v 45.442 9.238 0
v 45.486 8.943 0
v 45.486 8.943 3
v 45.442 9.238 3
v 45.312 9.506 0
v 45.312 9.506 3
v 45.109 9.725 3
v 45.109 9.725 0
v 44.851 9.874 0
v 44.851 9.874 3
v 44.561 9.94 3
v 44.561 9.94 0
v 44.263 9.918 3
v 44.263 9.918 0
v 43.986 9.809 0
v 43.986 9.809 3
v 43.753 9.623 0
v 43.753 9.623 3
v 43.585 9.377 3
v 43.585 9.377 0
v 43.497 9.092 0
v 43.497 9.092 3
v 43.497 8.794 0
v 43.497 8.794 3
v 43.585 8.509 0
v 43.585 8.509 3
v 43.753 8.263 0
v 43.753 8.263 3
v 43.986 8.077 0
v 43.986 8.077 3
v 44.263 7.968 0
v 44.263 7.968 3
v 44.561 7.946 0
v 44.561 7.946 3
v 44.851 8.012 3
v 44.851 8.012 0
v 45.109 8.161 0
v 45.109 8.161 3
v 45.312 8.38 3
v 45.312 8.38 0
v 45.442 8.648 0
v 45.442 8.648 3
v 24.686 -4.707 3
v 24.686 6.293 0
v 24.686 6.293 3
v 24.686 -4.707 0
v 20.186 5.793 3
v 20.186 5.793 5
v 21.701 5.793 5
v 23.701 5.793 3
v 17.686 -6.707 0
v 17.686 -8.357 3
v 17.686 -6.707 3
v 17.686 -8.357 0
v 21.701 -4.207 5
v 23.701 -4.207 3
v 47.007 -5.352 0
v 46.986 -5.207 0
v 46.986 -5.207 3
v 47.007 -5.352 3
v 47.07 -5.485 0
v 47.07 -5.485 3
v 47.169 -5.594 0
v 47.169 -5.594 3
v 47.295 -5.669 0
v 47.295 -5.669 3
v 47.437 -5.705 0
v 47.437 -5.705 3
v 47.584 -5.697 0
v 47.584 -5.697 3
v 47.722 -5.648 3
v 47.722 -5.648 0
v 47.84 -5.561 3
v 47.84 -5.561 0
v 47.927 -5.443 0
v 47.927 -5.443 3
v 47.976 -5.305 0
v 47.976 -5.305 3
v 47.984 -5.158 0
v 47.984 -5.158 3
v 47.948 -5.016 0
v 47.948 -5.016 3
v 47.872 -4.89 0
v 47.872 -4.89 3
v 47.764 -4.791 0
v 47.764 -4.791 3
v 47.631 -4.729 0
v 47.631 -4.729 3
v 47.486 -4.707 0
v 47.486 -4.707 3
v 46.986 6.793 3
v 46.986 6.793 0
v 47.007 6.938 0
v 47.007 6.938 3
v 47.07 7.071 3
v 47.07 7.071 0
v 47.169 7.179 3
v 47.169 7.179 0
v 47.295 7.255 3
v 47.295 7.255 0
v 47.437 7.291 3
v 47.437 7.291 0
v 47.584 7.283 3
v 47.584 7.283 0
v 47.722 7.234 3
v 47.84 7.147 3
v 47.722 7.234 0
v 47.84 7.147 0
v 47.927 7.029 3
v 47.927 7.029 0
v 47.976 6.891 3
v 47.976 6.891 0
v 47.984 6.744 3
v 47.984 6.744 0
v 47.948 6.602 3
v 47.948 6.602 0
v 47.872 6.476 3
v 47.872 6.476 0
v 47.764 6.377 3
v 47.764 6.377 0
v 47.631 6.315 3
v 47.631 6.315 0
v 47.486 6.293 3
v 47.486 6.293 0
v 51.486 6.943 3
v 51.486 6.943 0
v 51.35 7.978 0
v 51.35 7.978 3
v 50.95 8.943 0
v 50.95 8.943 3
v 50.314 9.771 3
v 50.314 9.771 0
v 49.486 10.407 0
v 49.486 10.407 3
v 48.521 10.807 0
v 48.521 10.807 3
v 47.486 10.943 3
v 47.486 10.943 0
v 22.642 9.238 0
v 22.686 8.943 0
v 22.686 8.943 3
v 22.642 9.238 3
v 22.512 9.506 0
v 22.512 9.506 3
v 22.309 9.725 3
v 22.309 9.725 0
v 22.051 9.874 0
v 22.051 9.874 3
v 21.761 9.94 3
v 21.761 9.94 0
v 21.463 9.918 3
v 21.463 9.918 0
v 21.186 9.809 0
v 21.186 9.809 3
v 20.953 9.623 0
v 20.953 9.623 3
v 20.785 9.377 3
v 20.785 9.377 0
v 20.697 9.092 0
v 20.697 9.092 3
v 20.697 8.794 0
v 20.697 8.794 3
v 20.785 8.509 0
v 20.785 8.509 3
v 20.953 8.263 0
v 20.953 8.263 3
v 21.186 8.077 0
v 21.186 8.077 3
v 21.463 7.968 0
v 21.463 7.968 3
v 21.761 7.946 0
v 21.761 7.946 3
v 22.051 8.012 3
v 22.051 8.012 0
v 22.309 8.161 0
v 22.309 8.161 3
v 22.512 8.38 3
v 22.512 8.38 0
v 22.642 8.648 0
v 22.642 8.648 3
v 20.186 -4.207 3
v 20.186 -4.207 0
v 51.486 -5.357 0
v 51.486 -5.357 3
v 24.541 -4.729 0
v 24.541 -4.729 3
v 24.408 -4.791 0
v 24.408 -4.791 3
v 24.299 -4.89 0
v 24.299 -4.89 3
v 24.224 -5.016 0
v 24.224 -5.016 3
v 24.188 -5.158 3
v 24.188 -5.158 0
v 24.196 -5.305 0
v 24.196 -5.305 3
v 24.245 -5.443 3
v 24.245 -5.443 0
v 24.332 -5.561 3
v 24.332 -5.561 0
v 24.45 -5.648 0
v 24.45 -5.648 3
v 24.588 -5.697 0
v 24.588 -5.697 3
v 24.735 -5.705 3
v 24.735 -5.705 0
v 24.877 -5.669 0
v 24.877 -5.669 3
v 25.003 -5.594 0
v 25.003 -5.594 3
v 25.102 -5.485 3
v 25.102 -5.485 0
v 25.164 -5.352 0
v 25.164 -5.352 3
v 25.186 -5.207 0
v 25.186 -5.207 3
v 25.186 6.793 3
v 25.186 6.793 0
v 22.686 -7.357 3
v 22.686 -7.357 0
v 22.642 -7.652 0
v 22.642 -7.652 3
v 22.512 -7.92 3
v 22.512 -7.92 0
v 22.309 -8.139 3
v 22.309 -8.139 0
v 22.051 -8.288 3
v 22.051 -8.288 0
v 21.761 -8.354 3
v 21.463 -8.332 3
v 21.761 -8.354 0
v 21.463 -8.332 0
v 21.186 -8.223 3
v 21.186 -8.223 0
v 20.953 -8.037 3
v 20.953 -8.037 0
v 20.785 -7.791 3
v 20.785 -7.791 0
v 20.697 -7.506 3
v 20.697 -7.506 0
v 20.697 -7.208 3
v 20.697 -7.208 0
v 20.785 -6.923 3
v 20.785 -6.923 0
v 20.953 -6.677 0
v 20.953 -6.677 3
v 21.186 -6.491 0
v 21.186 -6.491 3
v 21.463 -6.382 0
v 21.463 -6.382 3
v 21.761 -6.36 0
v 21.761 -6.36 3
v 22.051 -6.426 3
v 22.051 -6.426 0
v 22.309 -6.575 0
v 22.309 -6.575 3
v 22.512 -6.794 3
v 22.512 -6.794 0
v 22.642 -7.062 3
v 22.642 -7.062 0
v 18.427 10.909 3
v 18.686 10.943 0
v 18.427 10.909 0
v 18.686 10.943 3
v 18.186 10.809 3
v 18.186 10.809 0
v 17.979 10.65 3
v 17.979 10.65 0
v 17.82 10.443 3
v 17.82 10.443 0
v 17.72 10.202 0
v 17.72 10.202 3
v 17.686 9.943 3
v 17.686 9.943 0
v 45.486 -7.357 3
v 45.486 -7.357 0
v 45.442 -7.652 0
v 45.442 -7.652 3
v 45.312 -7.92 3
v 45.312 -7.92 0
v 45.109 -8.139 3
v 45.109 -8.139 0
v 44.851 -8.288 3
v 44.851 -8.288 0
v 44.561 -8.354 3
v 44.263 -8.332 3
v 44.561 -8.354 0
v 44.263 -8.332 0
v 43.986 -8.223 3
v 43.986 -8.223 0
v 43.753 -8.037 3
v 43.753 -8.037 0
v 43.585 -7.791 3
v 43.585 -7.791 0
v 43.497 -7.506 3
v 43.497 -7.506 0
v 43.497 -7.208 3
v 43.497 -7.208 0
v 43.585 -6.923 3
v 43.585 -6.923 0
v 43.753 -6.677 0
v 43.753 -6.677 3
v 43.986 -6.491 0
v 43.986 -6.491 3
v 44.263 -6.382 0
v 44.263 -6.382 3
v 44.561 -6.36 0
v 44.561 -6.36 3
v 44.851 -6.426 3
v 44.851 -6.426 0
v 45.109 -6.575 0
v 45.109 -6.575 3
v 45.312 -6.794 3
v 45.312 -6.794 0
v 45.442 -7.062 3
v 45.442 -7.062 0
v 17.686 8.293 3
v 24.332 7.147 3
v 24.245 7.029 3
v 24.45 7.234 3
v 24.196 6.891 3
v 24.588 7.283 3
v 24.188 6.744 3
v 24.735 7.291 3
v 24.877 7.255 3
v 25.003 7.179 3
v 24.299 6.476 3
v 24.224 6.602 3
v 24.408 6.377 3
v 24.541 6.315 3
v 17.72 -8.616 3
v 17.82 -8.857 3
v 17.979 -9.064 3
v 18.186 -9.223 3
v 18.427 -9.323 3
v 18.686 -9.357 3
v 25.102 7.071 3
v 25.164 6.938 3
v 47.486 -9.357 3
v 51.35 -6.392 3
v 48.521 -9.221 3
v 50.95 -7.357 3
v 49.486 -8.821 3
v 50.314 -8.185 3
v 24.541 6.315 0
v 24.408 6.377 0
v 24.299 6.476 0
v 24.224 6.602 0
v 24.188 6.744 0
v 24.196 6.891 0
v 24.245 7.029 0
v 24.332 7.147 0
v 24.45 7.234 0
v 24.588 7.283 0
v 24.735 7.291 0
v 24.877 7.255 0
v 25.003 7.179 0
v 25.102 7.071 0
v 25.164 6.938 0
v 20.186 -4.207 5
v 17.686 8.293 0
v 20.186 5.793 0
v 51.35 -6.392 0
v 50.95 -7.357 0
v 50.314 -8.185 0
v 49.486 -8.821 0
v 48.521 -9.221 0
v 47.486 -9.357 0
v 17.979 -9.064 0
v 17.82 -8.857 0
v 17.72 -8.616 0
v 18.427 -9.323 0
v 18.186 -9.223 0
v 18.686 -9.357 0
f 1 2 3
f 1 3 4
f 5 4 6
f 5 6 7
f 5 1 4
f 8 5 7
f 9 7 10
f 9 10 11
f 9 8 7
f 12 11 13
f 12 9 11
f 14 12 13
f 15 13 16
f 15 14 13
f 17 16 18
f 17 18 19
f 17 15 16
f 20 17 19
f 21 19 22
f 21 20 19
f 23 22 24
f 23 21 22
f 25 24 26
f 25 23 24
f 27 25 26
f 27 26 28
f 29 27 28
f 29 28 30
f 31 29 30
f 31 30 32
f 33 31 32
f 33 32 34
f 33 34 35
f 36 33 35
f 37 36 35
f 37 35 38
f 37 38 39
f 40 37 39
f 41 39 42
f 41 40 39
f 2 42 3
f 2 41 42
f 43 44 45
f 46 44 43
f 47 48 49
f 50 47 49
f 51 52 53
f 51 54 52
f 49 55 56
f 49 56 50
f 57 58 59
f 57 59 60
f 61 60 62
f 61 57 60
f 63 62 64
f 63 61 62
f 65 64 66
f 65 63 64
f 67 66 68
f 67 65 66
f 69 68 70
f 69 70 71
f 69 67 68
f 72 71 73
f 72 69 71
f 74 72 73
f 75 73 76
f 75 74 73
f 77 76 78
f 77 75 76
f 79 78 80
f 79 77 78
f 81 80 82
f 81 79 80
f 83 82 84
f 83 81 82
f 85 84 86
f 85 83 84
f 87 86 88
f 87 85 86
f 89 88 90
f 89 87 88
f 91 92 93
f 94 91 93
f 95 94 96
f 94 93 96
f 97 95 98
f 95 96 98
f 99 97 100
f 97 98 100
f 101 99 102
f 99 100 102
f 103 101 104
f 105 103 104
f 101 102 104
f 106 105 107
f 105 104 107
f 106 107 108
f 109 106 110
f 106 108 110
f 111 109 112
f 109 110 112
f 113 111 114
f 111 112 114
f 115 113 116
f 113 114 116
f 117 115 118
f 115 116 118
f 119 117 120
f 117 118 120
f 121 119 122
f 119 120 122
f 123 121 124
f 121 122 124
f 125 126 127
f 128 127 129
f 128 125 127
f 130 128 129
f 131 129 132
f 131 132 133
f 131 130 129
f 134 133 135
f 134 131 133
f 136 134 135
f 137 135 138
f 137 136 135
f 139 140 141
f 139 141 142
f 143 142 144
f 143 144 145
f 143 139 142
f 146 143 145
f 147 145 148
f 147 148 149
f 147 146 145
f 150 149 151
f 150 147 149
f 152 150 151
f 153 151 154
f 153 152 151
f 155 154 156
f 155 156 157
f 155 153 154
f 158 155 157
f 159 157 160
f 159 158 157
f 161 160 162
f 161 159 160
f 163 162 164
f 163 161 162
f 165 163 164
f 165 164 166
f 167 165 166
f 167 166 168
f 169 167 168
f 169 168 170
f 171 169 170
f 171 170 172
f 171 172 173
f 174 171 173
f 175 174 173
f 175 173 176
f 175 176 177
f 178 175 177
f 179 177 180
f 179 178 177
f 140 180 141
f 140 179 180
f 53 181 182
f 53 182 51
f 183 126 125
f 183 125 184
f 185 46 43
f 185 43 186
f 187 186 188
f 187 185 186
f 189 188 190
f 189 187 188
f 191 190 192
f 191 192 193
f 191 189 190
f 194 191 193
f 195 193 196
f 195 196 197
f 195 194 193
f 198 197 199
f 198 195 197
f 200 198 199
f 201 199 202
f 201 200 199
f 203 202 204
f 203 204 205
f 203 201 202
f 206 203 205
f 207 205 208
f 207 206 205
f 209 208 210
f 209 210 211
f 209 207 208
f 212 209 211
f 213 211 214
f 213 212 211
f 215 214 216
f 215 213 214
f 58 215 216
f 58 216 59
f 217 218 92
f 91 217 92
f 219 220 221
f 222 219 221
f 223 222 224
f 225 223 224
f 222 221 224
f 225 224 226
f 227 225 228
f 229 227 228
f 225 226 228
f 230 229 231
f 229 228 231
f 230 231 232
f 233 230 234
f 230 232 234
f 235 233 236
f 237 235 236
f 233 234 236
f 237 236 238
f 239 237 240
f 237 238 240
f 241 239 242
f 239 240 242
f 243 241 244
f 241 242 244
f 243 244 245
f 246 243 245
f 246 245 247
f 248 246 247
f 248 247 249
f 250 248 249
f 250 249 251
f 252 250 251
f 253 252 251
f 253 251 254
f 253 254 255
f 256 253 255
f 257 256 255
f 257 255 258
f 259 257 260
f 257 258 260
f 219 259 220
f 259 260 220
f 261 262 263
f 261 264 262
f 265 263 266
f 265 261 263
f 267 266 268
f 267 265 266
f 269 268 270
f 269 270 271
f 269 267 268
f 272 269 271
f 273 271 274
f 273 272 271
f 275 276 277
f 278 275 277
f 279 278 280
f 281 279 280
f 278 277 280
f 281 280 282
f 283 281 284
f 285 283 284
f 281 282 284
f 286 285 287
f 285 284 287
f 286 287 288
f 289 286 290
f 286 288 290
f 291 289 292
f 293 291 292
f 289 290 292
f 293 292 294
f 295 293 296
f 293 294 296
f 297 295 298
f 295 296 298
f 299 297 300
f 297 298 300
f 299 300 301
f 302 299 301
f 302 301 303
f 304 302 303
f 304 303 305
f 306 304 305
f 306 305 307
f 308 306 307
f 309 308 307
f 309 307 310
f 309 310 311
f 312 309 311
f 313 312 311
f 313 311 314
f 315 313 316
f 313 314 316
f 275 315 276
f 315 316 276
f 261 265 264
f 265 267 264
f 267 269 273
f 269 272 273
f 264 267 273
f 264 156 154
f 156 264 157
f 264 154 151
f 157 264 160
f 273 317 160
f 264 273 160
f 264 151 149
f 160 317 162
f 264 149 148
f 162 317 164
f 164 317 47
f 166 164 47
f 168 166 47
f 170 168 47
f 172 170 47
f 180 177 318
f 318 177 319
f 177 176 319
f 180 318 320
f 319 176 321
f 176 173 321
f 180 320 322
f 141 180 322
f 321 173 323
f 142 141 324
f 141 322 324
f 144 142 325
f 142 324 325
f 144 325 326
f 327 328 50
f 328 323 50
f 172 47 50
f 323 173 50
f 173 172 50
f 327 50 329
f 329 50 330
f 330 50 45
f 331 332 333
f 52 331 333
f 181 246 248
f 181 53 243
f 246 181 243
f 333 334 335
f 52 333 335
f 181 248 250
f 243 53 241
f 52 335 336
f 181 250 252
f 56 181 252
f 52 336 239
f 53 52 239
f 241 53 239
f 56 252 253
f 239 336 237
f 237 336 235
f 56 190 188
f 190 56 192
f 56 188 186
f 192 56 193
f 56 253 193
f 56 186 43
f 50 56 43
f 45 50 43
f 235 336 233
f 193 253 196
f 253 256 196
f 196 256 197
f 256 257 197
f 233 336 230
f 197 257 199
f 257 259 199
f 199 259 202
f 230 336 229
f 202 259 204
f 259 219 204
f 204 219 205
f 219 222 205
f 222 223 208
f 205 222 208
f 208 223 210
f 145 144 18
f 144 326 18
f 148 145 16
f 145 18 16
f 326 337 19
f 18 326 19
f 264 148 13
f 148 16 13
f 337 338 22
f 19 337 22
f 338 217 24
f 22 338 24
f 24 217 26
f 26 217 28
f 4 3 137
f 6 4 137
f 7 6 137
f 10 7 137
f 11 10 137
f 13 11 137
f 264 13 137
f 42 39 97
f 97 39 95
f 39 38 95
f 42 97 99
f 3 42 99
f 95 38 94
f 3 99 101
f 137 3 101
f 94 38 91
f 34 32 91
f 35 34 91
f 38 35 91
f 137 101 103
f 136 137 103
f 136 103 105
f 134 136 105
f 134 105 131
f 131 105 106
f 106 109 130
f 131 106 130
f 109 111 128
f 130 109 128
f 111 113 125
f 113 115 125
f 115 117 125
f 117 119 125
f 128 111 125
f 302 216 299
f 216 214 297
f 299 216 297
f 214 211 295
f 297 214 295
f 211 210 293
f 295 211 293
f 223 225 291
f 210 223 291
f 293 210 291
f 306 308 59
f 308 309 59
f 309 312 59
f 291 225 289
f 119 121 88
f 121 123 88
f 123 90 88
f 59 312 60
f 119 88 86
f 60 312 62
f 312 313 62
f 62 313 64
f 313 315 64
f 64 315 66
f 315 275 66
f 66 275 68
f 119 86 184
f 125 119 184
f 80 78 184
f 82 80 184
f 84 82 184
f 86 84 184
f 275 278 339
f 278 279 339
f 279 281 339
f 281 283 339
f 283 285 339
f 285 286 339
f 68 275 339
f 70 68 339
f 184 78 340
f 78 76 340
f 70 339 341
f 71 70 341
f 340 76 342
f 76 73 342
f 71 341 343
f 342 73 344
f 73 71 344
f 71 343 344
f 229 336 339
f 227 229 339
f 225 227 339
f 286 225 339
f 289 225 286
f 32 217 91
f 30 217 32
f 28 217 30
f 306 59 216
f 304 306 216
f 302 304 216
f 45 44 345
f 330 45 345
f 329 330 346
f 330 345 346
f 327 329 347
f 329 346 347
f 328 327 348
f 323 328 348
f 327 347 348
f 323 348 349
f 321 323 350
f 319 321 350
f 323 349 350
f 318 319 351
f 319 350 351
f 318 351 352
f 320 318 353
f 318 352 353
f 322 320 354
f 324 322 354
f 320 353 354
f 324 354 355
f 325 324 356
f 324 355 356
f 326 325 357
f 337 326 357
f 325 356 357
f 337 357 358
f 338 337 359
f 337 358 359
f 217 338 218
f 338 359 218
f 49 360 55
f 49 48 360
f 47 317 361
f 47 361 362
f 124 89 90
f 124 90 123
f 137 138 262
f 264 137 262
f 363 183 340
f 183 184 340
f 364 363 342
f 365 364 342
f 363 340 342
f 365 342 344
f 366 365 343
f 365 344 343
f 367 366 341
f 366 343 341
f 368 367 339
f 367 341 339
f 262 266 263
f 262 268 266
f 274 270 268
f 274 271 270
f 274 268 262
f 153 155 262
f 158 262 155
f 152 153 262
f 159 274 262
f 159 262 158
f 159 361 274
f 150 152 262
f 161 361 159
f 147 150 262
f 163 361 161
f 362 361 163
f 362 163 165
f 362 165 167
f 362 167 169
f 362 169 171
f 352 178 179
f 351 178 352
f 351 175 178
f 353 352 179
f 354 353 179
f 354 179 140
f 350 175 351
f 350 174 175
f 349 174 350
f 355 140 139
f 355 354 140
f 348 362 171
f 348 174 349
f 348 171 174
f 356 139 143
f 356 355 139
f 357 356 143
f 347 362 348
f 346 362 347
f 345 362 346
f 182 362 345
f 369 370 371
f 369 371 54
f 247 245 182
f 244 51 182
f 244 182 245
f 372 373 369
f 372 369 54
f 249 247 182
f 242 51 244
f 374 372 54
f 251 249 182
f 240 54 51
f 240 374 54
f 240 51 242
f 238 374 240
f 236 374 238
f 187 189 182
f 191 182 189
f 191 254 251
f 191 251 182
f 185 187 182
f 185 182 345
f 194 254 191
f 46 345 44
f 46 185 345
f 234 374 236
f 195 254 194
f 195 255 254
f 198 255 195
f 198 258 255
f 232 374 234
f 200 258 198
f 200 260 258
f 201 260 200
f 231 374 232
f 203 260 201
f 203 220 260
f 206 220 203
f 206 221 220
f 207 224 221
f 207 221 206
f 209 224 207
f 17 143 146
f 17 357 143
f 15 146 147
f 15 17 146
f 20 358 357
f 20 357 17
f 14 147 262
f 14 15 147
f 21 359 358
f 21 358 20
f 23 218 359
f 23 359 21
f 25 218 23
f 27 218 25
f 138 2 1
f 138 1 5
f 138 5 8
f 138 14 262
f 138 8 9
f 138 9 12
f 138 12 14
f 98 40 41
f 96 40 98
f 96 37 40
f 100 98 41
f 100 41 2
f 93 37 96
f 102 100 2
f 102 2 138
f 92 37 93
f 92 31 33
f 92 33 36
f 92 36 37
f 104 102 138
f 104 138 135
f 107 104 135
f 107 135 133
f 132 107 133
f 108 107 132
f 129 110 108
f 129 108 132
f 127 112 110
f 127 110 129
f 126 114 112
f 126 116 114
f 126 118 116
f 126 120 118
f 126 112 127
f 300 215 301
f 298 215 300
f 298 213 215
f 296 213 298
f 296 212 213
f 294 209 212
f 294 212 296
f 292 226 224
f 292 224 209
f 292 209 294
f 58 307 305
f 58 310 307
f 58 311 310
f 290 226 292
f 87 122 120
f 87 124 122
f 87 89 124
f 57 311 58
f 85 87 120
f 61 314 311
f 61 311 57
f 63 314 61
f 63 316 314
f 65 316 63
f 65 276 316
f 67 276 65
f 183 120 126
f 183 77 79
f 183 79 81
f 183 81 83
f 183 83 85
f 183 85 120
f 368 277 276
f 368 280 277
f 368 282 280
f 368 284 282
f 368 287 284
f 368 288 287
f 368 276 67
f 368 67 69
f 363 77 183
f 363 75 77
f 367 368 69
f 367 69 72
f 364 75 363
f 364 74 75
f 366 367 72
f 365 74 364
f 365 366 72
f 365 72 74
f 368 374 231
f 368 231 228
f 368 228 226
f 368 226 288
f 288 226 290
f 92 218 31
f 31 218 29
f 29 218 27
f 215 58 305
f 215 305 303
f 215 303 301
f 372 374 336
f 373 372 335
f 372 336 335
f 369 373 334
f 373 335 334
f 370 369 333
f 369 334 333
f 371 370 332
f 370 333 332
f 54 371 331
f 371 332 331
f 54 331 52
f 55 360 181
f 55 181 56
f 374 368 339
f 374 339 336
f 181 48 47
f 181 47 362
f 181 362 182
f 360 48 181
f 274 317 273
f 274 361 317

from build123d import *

# Parameters (mm, degrees)
SKETCH2_R           = 1
BOSS_EXTRUDE1_DEPTH = 3
SKETCH3_W           = 3.515258844
SKETCH3_H           = 10
BOSS_EXTRUDE2_DEPTH = 2
CHAMFER1_SIZE       = 2
FILLET1_R           = 4
FILLET2_R           = 1
CUT_EXTRUDE1_DEPTH  = 4


with BuildPart() as part:
    # Sketch2 → Boss-Extrude1 (new body)
    with BuildSketch(Plane.XY):
        with BuildLine():
            Line((47.48595993, 0.792979965), (51.48595993, 0.792979965))
            Line((51.48595993, 0.792979965), (51.48595993, 10.942979965))
            Line((51.48595993, 10.942979965), (17.68595993, 10.942979965))
            Line((17.68595993, 10.942979965), (17.68595993, 0.792979965))
            Line((17.68595993, 0.792979965), (24.68595993, 0.792979965))
            Line((24.68595993, 0.792979965), (24.68595993, 6.292979965))
            ThreePointArc((24.68595993, 6.292979965), (24.33240654, 7.146533356), (25.18595993, 6.792979965))
            Line((25.18595993, 6.792979965), (46.98595993, 6.792979965))
            ThreePointArc((46.98595993, 6.792979965), (47.839513321, 7.146533356), (47.48595993, 6.292979965))
            Line((47.48595993, 6.292979965), (47.48595993, 0.792979965))
        make_face()
        with Locations((44.48595993, 8.942979965)):
            Circle(SKETCH2_R, mode=Mode.SUBTRACT)
        with Locations((21.68595993, 8.942979965)):
            Circle(SKETCH2_R, mode=Mode.SUBTRACT)
    extrude(amount=BOSS_EXTRUDE1_DEPTH)

    # Mirror1: part across plane


with BuildPart() as part_1:
    add(part.part)
    add(part.part.mirror(Plane(origin=(0, 0.792979965, 3), x_dir=(0, 0, 1), z_dir=(0, -1, 0))))

    # Sketch3 → Boss-Extrude2 (add)
    with BuildSketch(Plane.XY.offset(3)):
        with Locations((21.943589352, 0.792979965)):
            Rectangle(SKETCH3_W, SKETCH3_H)
    extrude(amount=BOSS_EXTRUDE2_DEPTH)

    # Chamfer1
    chamfer1_edges = [part_1.edges().sort_by_distance(p)[0] for p in [
        (23.701218774, 0.792979965, 5),
    ]]
    chamfer(chamfer1_edges, length=CHAMFER1_SIZE - 0.0001)  # a hair under: the kernel refuses the full size

    # Fillet1
    fillet1_edges = [part_1.edges().sort_by_distance(p)[0] for p in [
        (51.48595993, 10.942979965, 1.5),
        (51.48595993, -9.357020035, 1.5),
    ]]
    fillet(fillet1_edges, radius=FILLET1_R)

    # Fillet2
    fillet2_edges = [part_1.edges().sort_by_distance(p)[0] for p in [
        (17.68595993, 10.942979965, 1.5),
        (17.68595993, -9.357020035, 1.5),
    ]]
    fillet(fillet2_edges, radius=FILLET2_R)

    # Sketch4 → Cut-Extrude1 (cut)
    with BuildSketch(Plane.XY.offset(3)):
        Polygon((20.18595993, -4.207020035), (17.68595993, -6.707020035), (17.68595993, 8.292979965), (20.18595993, 5.792979965), align=None)
    extrude(amount=-CUT_EXTRUDE1_DEPTH, mode=Mode.SUBTRACT)


solid = part_1.part
